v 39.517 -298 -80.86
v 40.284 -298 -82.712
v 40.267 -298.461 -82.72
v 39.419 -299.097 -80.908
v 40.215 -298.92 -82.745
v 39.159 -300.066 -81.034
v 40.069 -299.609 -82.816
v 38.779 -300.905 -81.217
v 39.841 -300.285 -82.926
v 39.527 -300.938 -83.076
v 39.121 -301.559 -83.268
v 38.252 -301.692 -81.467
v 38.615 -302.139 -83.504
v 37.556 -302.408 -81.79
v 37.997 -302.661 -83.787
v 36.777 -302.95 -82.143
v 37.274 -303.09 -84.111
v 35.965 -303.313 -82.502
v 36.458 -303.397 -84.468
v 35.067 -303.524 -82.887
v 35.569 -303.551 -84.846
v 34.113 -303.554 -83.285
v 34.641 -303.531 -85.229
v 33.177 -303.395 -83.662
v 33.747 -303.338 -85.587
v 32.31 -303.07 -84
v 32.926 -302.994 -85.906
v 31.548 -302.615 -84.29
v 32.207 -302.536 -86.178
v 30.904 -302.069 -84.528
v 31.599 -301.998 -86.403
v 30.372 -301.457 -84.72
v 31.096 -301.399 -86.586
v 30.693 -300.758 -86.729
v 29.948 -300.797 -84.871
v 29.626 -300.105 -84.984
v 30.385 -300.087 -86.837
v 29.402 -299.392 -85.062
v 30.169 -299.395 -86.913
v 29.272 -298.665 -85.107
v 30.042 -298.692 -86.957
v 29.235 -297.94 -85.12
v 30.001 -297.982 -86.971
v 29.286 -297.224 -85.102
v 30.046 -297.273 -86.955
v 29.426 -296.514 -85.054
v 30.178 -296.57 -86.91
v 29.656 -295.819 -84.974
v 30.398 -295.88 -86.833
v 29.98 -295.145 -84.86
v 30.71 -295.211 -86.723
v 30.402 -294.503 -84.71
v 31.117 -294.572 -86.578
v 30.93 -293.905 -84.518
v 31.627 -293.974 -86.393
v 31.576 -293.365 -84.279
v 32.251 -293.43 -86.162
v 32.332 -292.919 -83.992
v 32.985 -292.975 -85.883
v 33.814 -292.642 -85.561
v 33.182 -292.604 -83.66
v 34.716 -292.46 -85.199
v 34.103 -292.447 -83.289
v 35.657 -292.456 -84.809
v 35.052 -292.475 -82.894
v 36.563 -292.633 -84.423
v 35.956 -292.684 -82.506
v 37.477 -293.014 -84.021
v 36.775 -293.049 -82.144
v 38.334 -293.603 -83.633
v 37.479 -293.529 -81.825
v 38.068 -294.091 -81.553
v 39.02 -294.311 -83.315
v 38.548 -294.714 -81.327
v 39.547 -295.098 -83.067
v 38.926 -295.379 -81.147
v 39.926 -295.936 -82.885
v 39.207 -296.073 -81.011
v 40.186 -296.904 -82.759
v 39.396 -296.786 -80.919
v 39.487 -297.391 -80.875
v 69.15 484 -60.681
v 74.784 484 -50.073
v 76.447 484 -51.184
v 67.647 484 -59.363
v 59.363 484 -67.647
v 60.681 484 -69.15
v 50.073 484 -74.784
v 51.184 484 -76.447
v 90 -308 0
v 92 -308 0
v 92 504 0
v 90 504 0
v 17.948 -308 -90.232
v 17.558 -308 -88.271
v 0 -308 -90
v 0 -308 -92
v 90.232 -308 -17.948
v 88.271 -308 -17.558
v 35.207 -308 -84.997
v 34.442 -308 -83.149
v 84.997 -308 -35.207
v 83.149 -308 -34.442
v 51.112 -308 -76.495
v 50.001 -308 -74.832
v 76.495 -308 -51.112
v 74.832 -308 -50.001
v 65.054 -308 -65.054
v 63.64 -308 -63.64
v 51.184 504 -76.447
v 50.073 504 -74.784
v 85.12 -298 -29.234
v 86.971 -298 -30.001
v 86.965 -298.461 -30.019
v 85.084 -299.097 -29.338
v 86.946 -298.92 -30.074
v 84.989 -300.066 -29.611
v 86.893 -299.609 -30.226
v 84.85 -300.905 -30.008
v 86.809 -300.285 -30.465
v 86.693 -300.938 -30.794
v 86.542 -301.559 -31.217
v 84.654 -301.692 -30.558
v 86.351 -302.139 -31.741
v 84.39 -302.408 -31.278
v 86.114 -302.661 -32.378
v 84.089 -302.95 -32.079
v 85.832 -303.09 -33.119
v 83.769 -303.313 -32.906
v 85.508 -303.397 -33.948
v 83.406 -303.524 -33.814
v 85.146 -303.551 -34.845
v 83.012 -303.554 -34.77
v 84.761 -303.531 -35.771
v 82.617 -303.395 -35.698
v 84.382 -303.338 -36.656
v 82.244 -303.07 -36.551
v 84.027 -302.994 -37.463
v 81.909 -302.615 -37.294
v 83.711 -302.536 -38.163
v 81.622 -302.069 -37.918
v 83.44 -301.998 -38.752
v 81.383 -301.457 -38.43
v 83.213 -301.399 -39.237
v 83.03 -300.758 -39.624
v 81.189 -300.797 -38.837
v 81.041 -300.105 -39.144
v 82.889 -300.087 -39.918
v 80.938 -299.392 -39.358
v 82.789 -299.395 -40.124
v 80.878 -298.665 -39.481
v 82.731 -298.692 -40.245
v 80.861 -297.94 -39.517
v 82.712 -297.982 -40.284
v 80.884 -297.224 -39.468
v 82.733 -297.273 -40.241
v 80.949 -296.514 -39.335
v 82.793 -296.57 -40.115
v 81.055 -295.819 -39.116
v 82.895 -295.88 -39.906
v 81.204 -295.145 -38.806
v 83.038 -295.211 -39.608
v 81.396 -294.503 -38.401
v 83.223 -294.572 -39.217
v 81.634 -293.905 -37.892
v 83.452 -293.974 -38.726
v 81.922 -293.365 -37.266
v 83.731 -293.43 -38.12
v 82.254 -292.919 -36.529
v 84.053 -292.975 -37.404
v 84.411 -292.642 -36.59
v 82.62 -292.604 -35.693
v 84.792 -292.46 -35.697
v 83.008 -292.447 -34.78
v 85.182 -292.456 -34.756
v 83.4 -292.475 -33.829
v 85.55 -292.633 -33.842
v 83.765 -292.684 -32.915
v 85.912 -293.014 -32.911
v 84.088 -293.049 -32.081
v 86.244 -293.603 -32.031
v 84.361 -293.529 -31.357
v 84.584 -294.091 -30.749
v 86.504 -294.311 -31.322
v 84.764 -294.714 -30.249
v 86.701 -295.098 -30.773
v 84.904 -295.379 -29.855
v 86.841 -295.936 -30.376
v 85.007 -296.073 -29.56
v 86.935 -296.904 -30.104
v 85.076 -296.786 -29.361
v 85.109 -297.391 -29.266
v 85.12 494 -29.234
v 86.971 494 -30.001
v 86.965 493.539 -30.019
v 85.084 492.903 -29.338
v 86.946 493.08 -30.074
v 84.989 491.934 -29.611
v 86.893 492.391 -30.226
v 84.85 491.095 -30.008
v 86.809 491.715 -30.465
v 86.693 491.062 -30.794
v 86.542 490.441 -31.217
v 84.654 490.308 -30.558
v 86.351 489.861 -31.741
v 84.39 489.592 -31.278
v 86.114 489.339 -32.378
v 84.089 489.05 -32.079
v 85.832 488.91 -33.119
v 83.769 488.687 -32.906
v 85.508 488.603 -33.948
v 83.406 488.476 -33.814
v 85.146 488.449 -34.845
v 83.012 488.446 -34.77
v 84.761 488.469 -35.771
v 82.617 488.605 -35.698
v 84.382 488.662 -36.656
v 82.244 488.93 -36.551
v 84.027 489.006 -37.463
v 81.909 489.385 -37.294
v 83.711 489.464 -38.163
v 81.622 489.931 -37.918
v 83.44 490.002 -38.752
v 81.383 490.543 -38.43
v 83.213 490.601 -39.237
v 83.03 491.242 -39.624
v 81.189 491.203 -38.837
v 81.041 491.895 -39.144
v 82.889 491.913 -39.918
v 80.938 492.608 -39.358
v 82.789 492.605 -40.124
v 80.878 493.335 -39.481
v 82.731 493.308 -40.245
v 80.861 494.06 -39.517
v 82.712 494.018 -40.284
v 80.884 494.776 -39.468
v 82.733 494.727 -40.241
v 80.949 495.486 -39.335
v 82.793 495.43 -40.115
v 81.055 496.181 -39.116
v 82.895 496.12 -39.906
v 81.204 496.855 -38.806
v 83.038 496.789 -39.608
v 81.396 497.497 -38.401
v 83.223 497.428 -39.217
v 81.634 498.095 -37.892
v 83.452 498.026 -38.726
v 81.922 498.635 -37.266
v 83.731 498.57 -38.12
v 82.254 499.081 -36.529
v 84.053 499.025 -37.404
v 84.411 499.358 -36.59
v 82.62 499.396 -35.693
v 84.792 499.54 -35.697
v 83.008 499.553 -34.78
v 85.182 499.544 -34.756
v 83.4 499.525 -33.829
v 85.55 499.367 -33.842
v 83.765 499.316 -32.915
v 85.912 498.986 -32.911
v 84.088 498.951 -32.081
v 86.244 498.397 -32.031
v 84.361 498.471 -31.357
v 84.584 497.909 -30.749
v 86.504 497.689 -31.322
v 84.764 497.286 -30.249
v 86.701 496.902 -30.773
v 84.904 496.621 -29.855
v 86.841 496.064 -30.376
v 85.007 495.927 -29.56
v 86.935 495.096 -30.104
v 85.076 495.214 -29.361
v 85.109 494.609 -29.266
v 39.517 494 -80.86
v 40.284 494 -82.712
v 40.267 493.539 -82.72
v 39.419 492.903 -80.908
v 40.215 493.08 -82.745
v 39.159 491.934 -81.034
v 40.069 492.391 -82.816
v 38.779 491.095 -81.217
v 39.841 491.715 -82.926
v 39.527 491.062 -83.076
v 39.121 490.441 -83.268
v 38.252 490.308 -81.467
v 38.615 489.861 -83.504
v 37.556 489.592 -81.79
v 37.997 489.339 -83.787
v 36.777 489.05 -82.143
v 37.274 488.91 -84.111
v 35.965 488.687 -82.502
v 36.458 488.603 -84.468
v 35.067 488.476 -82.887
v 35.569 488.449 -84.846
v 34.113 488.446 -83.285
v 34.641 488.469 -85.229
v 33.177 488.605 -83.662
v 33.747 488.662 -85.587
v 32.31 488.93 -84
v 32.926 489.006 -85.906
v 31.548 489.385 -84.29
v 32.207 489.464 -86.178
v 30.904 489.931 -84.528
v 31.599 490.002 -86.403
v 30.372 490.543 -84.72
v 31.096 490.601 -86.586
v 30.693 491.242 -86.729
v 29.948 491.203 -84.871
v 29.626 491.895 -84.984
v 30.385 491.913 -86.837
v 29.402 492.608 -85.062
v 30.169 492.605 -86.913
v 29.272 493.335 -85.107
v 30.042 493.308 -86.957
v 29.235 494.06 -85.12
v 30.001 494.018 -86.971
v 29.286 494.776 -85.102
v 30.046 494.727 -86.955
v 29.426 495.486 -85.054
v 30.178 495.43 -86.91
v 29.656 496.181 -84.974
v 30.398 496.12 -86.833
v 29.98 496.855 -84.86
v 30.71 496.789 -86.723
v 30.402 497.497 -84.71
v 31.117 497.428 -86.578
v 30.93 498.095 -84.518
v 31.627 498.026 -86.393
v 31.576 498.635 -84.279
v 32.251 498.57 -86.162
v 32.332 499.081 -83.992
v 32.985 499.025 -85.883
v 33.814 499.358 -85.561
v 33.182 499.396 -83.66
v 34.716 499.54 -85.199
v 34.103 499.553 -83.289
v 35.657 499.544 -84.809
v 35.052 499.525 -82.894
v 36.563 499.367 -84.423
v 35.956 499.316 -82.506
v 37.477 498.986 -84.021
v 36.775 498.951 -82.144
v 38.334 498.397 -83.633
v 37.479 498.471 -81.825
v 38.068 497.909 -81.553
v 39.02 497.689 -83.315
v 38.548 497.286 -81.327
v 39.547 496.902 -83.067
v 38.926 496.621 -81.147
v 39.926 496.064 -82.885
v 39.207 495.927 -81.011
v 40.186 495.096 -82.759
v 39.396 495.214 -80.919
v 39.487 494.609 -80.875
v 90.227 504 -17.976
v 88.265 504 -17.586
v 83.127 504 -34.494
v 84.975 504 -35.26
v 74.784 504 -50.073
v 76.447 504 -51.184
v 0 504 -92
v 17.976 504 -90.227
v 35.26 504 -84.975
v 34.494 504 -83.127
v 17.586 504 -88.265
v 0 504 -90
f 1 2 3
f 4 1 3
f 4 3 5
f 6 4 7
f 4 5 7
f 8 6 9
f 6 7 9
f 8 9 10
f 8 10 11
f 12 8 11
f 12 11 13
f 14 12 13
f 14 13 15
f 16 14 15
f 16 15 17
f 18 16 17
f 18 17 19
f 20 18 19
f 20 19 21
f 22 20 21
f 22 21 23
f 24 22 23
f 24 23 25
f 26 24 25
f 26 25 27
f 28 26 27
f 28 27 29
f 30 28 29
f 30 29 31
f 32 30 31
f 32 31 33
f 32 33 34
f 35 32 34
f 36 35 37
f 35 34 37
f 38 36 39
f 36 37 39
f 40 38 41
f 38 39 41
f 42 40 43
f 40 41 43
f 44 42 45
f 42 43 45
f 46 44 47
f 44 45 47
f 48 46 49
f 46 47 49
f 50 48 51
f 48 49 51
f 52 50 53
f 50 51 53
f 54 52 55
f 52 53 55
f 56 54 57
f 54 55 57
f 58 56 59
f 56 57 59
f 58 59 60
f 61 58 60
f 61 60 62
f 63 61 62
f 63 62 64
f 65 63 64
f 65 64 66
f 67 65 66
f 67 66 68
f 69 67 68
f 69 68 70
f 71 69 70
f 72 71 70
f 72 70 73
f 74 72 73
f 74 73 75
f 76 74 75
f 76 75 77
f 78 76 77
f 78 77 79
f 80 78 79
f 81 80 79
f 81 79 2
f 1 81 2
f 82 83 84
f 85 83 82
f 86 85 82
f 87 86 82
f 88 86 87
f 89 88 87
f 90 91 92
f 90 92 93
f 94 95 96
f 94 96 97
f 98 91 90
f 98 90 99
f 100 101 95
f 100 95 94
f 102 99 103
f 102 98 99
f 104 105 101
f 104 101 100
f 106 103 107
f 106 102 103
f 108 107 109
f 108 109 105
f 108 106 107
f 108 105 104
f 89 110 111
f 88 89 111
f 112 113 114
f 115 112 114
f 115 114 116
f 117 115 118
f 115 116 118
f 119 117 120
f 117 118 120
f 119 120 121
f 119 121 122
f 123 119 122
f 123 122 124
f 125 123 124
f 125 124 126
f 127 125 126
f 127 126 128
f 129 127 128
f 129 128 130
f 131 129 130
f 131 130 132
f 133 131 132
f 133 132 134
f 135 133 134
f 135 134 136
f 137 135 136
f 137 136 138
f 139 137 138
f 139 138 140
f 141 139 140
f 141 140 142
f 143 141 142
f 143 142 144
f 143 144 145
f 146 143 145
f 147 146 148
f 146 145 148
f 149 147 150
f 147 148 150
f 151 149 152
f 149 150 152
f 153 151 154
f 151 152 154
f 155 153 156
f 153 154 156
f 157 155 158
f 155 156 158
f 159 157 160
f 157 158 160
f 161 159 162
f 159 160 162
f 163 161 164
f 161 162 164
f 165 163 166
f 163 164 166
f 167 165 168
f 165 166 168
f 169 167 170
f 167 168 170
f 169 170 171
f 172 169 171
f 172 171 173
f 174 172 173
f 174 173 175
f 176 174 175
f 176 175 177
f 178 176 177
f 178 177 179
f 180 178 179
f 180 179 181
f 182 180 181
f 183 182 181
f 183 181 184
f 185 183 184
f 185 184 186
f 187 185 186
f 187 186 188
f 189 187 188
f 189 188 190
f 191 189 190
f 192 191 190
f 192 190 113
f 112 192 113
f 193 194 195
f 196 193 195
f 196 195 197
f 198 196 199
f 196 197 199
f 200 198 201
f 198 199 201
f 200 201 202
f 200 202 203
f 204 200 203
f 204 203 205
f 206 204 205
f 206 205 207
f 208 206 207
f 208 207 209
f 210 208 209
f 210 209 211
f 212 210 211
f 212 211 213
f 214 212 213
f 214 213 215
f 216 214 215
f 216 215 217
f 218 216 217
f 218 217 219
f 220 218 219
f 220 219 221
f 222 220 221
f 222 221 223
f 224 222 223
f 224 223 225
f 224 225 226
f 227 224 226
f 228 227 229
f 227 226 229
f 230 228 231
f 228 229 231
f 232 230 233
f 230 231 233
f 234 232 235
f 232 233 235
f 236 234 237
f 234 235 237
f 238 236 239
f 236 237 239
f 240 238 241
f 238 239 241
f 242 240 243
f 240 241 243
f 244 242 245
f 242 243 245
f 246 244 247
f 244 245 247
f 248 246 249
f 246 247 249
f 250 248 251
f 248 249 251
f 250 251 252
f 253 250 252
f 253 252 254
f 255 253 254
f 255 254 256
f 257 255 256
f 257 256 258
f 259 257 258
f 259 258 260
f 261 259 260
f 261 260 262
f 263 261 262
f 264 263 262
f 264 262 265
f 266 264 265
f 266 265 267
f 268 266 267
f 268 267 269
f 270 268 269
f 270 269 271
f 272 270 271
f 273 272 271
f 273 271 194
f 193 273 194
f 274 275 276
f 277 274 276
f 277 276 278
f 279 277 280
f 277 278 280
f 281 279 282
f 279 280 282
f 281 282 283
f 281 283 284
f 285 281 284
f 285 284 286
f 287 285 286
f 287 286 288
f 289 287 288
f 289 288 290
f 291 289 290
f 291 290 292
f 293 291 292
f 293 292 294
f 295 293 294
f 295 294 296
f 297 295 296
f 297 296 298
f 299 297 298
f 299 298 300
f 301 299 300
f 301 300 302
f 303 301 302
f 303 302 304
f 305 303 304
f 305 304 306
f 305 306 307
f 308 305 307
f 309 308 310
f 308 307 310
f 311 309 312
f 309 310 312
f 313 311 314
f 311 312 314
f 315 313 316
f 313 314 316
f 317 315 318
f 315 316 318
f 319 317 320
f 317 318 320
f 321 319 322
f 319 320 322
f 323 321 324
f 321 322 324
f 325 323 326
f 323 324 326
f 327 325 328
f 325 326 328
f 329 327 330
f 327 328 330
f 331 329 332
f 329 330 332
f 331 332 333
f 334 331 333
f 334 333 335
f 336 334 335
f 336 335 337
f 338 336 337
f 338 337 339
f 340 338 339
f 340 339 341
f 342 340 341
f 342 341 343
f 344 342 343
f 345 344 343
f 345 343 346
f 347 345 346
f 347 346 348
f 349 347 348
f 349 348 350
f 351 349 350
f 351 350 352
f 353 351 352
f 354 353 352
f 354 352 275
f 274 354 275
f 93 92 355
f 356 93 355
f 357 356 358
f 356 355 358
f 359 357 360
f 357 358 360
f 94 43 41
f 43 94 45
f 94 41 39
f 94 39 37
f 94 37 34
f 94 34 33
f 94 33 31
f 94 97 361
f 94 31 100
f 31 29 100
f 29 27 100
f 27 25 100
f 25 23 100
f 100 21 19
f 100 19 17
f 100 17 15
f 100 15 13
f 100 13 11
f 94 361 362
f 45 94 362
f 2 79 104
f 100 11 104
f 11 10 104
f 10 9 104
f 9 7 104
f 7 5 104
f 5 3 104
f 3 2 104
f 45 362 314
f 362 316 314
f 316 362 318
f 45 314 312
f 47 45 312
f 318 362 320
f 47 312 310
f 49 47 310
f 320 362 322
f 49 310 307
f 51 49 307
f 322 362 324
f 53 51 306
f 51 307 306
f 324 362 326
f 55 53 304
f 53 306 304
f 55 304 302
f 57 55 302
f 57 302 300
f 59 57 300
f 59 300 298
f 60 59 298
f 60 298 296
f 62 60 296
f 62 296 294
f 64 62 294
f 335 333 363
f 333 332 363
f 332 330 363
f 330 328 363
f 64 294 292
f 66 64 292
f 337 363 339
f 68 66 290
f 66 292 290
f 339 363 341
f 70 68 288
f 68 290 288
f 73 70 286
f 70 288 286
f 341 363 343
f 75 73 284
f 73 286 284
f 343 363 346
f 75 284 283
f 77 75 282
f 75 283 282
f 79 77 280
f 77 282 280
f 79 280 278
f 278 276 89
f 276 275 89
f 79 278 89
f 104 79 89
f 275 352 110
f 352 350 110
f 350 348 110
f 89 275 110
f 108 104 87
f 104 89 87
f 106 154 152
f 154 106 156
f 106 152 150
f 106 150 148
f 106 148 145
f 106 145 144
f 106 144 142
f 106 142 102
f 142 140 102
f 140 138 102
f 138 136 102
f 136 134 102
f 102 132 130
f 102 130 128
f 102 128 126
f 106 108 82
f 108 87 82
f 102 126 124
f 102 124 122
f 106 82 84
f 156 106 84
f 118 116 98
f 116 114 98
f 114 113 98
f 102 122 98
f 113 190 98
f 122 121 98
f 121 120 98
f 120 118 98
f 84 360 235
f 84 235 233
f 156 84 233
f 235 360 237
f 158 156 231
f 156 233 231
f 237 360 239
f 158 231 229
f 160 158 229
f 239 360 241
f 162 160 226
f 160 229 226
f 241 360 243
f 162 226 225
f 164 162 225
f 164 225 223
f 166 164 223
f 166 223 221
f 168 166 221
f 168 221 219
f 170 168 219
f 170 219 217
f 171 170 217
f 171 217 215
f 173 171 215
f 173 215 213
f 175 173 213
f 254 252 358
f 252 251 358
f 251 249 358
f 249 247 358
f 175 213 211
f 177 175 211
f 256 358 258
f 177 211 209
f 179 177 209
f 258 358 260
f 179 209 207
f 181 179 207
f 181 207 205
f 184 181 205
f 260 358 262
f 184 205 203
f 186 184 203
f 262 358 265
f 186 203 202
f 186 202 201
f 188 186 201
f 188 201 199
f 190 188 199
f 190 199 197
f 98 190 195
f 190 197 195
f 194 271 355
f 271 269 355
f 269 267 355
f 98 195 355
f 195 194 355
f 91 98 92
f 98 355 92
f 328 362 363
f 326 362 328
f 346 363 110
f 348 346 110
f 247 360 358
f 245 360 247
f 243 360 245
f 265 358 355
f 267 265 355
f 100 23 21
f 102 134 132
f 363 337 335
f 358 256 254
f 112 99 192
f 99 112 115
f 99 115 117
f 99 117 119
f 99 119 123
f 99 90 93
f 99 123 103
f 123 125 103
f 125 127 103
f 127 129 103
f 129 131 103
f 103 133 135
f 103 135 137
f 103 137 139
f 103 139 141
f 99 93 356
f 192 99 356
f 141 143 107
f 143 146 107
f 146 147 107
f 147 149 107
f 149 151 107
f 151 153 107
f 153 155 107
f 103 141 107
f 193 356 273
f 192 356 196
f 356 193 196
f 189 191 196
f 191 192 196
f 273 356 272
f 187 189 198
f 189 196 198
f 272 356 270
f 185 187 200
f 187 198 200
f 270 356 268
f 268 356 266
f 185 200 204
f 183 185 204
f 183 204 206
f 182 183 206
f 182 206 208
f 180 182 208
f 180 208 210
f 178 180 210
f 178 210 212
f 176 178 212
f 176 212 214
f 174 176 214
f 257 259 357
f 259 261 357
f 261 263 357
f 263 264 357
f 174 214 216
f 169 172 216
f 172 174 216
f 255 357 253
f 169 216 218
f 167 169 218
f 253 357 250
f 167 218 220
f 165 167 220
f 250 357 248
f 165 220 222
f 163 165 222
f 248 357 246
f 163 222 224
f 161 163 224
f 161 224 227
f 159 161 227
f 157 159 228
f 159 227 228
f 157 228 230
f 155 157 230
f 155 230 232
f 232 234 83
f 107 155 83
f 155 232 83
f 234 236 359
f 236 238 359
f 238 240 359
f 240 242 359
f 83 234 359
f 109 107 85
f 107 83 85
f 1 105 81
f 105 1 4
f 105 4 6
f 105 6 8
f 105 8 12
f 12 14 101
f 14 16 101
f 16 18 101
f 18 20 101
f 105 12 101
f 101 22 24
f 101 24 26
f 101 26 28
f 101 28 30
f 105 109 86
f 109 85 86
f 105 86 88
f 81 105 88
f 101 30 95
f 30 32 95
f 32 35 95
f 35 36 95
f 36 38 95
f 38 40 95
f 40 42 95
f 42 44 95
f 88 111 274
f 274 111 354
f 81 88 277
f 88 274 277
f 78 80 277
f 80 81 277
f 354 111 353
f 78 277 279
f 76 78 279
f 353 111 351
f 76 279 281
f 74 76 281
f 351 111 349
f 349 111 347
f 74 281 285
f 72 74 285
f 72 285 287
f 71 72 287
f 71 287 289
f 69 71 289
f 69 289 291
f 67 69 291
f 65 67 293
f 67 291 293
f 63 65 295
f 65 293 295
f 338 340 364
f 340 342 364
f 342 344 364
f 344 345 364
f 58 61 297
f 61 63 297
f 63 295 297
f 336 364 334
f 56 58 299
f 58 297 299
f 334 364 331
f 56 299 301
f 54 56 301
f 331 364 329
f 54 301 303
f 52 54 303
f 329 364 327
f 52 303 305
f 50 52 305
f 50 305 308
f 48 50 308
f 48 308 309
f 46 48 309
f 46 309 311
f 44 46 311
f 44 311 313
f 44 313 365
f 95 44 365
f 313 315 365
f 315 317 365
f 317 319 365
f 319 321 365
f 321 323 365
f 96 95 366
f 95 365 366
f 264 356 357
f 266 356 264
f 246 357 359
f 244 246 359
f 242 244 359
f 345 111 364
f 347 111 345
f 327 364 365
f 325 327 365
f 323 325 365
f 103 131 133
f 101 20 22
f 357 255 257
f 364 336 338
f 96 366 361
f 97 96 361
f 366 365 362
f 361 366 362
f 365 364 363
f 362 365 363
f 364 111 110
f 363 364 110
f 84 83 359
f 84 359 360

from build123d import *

# Parameters (mm, degrees)
BOSS_EXTRUDE1_DEPTH     = 812
CUT_EXTRUDE2_REACH      = 820.409
CUT_EXTRUDE2_END_RADIUS = 90
SKETCH3_R               = 5.565
CUT_EXTRUDE3_REACH      = 820.409
CUT_EXTRUDE3_END_RADIUS = 90
SKETCH5_R               = 5.565
LPATTERN2_COUNT         = 2
LPATTERN2_PITCH         = 792
CUT_EXTRUDE5_DEPTH      = 20
BODY_MOVE_COPY1_ANGLE   = 180


with BuildPart() as part:
    # Sketch1 → Boss-Extrude1 (new body)
    with BuildSketch(Plane(origin=(0, 0, 0), x_dir=(1, 0, 0), z_dir=(0, 1, 0))):
        with BuildLine():
            Line((0, 92), (0, 90))
            ThreePointArc((0, 90), (63.639610307, 63.639610307), (90, 0))
            Line((90, 0), (92, 0))
            ThreePointArc((92, 0), (65.053823869, 65.053823869), (0, 92))
        make_face()
    extrude(amount=BOSS_EXTRUDE1_DEPTH)

    # Cut-Extrude2: up to this cylinder (the profile starts outside it)
    cut_extrude2_end = Plane(origin=(0, 10, 0), z_dir=(0, -1, 0)) * Cylinder(CUT_EXTRUDE2_END_RADIUS, 1821.818, mode=Mode.PRIVATE)
    # Sketch3 → Cut-Extrude2 (cut, up to the surface)
    with BuildSketch(Plane(origin=(84.996916991, 0, -35.206875778), x_dir=(-0.38268343236509045, 0, -0.9238795325112865), z_dir=(0.9238795325112865, 0, -0.38268343236509045)), mode=Mode.PRIVATE) as cut_extrude2_sk1:
        with Locations((0, 10)):
            Circle(SKETCH3_R)
    cut_extrude2_tool1 = extrude(cut_extrude2_sk1.sketch, amount=-CUT_EXTRUDE2_REACH, mode=Mode.PRIVATE) - cut_extrude2_end
    cut_extrude2 = cut_extrude2_tool1.solids().sort_by_distance((84.996917, 10, -35.206876))[0]
    add(cut_extrude2, mode=Mode.SUBTRACT)

    # Cut-Extrude3: up to this cylinder (the profile starts outside it)
    cut_extrude3_end = Plane(origin=(0, 10, 0), z_dir=(0, -1, 0)) * Cylinder(CUT_EXTRUDE3_END_RADIUS, 1821.818, mode=Mode.PRIVATE)
    # Sketch5 → Cut-Extrude3 (cut, up to the surface)
    with BuildSketch(Plane(origin=(35.206875778, 0, -84.996916991), x_dir=(-0.9238795325112878, 0, -0.3826834323650876), z_dir=(0.3826834323650876, 0, -0.9238795325112878)), mode=Mode.PRIVATE) as cut_extrude3_sk1:
        with Locations((0, 10)):
            Circle(SKETCH5_R)
    cut_extrude3_tool1 = extrude(cut_extrude3_sk1.sketch, amount=-CUT_EXTRUDE3_REACH, mode=Mode.PRIVATE) - cut_extrude3_end
    cut_extrude3 = cut_extrude3_tool1.solids().sort_by_distance((35.206876, 10, -84.996917))[0]
    add(cut_extrude3, mode=Mode.SUBTRACT)

    # LPattern2: Cut-Extrude2, Cut-Extrude3 ×2
    with Locations(*[(0, i * LPATTERN2_PITCH, 0) for i in range(1, LPATTERN2_COUNT)]):
        add(cut_extrude2, mode=Mode.SUBTRACT)
        add(cut_extrude3, mode=Mode.SUBTRACT)

    # Sketch7 → Cut-Extrude5 (cut)
    with BuildSketch(Plane.XZ):
        with BuildLine():
            Line((76.447375943, -51.183969281), (74.784435976, -50.072828318))
            ThreePointArc((74.784435976, -50.072828318), (63.639610307, -63.639610307), (50.072828318, -74.784435976))
            Line((50.072828318, -74.784435976), (51.183969281, -76.447375943))
            ThreePointArc((51.183969281, -76.447375943), (65.053823869, -65.053823869), (76.447375943, -51.183969281))
        make_face()
    extrude(amount=-CUT_EXTRUDE5_DEPTH, mode=Mode.SUBTRACT)


with BuildPart() as part_1:
    # Body-Move/Copy1: moved
    add(part.part.moved(Location((0, 0, 0))).rotate(Axis((0, 252, 0), (0.7071067811865488, -4.937700262164522e-15, -0.7071067811865462)), BODY_MOVE_COPY1_ANGLE))


solid = part_1.part
